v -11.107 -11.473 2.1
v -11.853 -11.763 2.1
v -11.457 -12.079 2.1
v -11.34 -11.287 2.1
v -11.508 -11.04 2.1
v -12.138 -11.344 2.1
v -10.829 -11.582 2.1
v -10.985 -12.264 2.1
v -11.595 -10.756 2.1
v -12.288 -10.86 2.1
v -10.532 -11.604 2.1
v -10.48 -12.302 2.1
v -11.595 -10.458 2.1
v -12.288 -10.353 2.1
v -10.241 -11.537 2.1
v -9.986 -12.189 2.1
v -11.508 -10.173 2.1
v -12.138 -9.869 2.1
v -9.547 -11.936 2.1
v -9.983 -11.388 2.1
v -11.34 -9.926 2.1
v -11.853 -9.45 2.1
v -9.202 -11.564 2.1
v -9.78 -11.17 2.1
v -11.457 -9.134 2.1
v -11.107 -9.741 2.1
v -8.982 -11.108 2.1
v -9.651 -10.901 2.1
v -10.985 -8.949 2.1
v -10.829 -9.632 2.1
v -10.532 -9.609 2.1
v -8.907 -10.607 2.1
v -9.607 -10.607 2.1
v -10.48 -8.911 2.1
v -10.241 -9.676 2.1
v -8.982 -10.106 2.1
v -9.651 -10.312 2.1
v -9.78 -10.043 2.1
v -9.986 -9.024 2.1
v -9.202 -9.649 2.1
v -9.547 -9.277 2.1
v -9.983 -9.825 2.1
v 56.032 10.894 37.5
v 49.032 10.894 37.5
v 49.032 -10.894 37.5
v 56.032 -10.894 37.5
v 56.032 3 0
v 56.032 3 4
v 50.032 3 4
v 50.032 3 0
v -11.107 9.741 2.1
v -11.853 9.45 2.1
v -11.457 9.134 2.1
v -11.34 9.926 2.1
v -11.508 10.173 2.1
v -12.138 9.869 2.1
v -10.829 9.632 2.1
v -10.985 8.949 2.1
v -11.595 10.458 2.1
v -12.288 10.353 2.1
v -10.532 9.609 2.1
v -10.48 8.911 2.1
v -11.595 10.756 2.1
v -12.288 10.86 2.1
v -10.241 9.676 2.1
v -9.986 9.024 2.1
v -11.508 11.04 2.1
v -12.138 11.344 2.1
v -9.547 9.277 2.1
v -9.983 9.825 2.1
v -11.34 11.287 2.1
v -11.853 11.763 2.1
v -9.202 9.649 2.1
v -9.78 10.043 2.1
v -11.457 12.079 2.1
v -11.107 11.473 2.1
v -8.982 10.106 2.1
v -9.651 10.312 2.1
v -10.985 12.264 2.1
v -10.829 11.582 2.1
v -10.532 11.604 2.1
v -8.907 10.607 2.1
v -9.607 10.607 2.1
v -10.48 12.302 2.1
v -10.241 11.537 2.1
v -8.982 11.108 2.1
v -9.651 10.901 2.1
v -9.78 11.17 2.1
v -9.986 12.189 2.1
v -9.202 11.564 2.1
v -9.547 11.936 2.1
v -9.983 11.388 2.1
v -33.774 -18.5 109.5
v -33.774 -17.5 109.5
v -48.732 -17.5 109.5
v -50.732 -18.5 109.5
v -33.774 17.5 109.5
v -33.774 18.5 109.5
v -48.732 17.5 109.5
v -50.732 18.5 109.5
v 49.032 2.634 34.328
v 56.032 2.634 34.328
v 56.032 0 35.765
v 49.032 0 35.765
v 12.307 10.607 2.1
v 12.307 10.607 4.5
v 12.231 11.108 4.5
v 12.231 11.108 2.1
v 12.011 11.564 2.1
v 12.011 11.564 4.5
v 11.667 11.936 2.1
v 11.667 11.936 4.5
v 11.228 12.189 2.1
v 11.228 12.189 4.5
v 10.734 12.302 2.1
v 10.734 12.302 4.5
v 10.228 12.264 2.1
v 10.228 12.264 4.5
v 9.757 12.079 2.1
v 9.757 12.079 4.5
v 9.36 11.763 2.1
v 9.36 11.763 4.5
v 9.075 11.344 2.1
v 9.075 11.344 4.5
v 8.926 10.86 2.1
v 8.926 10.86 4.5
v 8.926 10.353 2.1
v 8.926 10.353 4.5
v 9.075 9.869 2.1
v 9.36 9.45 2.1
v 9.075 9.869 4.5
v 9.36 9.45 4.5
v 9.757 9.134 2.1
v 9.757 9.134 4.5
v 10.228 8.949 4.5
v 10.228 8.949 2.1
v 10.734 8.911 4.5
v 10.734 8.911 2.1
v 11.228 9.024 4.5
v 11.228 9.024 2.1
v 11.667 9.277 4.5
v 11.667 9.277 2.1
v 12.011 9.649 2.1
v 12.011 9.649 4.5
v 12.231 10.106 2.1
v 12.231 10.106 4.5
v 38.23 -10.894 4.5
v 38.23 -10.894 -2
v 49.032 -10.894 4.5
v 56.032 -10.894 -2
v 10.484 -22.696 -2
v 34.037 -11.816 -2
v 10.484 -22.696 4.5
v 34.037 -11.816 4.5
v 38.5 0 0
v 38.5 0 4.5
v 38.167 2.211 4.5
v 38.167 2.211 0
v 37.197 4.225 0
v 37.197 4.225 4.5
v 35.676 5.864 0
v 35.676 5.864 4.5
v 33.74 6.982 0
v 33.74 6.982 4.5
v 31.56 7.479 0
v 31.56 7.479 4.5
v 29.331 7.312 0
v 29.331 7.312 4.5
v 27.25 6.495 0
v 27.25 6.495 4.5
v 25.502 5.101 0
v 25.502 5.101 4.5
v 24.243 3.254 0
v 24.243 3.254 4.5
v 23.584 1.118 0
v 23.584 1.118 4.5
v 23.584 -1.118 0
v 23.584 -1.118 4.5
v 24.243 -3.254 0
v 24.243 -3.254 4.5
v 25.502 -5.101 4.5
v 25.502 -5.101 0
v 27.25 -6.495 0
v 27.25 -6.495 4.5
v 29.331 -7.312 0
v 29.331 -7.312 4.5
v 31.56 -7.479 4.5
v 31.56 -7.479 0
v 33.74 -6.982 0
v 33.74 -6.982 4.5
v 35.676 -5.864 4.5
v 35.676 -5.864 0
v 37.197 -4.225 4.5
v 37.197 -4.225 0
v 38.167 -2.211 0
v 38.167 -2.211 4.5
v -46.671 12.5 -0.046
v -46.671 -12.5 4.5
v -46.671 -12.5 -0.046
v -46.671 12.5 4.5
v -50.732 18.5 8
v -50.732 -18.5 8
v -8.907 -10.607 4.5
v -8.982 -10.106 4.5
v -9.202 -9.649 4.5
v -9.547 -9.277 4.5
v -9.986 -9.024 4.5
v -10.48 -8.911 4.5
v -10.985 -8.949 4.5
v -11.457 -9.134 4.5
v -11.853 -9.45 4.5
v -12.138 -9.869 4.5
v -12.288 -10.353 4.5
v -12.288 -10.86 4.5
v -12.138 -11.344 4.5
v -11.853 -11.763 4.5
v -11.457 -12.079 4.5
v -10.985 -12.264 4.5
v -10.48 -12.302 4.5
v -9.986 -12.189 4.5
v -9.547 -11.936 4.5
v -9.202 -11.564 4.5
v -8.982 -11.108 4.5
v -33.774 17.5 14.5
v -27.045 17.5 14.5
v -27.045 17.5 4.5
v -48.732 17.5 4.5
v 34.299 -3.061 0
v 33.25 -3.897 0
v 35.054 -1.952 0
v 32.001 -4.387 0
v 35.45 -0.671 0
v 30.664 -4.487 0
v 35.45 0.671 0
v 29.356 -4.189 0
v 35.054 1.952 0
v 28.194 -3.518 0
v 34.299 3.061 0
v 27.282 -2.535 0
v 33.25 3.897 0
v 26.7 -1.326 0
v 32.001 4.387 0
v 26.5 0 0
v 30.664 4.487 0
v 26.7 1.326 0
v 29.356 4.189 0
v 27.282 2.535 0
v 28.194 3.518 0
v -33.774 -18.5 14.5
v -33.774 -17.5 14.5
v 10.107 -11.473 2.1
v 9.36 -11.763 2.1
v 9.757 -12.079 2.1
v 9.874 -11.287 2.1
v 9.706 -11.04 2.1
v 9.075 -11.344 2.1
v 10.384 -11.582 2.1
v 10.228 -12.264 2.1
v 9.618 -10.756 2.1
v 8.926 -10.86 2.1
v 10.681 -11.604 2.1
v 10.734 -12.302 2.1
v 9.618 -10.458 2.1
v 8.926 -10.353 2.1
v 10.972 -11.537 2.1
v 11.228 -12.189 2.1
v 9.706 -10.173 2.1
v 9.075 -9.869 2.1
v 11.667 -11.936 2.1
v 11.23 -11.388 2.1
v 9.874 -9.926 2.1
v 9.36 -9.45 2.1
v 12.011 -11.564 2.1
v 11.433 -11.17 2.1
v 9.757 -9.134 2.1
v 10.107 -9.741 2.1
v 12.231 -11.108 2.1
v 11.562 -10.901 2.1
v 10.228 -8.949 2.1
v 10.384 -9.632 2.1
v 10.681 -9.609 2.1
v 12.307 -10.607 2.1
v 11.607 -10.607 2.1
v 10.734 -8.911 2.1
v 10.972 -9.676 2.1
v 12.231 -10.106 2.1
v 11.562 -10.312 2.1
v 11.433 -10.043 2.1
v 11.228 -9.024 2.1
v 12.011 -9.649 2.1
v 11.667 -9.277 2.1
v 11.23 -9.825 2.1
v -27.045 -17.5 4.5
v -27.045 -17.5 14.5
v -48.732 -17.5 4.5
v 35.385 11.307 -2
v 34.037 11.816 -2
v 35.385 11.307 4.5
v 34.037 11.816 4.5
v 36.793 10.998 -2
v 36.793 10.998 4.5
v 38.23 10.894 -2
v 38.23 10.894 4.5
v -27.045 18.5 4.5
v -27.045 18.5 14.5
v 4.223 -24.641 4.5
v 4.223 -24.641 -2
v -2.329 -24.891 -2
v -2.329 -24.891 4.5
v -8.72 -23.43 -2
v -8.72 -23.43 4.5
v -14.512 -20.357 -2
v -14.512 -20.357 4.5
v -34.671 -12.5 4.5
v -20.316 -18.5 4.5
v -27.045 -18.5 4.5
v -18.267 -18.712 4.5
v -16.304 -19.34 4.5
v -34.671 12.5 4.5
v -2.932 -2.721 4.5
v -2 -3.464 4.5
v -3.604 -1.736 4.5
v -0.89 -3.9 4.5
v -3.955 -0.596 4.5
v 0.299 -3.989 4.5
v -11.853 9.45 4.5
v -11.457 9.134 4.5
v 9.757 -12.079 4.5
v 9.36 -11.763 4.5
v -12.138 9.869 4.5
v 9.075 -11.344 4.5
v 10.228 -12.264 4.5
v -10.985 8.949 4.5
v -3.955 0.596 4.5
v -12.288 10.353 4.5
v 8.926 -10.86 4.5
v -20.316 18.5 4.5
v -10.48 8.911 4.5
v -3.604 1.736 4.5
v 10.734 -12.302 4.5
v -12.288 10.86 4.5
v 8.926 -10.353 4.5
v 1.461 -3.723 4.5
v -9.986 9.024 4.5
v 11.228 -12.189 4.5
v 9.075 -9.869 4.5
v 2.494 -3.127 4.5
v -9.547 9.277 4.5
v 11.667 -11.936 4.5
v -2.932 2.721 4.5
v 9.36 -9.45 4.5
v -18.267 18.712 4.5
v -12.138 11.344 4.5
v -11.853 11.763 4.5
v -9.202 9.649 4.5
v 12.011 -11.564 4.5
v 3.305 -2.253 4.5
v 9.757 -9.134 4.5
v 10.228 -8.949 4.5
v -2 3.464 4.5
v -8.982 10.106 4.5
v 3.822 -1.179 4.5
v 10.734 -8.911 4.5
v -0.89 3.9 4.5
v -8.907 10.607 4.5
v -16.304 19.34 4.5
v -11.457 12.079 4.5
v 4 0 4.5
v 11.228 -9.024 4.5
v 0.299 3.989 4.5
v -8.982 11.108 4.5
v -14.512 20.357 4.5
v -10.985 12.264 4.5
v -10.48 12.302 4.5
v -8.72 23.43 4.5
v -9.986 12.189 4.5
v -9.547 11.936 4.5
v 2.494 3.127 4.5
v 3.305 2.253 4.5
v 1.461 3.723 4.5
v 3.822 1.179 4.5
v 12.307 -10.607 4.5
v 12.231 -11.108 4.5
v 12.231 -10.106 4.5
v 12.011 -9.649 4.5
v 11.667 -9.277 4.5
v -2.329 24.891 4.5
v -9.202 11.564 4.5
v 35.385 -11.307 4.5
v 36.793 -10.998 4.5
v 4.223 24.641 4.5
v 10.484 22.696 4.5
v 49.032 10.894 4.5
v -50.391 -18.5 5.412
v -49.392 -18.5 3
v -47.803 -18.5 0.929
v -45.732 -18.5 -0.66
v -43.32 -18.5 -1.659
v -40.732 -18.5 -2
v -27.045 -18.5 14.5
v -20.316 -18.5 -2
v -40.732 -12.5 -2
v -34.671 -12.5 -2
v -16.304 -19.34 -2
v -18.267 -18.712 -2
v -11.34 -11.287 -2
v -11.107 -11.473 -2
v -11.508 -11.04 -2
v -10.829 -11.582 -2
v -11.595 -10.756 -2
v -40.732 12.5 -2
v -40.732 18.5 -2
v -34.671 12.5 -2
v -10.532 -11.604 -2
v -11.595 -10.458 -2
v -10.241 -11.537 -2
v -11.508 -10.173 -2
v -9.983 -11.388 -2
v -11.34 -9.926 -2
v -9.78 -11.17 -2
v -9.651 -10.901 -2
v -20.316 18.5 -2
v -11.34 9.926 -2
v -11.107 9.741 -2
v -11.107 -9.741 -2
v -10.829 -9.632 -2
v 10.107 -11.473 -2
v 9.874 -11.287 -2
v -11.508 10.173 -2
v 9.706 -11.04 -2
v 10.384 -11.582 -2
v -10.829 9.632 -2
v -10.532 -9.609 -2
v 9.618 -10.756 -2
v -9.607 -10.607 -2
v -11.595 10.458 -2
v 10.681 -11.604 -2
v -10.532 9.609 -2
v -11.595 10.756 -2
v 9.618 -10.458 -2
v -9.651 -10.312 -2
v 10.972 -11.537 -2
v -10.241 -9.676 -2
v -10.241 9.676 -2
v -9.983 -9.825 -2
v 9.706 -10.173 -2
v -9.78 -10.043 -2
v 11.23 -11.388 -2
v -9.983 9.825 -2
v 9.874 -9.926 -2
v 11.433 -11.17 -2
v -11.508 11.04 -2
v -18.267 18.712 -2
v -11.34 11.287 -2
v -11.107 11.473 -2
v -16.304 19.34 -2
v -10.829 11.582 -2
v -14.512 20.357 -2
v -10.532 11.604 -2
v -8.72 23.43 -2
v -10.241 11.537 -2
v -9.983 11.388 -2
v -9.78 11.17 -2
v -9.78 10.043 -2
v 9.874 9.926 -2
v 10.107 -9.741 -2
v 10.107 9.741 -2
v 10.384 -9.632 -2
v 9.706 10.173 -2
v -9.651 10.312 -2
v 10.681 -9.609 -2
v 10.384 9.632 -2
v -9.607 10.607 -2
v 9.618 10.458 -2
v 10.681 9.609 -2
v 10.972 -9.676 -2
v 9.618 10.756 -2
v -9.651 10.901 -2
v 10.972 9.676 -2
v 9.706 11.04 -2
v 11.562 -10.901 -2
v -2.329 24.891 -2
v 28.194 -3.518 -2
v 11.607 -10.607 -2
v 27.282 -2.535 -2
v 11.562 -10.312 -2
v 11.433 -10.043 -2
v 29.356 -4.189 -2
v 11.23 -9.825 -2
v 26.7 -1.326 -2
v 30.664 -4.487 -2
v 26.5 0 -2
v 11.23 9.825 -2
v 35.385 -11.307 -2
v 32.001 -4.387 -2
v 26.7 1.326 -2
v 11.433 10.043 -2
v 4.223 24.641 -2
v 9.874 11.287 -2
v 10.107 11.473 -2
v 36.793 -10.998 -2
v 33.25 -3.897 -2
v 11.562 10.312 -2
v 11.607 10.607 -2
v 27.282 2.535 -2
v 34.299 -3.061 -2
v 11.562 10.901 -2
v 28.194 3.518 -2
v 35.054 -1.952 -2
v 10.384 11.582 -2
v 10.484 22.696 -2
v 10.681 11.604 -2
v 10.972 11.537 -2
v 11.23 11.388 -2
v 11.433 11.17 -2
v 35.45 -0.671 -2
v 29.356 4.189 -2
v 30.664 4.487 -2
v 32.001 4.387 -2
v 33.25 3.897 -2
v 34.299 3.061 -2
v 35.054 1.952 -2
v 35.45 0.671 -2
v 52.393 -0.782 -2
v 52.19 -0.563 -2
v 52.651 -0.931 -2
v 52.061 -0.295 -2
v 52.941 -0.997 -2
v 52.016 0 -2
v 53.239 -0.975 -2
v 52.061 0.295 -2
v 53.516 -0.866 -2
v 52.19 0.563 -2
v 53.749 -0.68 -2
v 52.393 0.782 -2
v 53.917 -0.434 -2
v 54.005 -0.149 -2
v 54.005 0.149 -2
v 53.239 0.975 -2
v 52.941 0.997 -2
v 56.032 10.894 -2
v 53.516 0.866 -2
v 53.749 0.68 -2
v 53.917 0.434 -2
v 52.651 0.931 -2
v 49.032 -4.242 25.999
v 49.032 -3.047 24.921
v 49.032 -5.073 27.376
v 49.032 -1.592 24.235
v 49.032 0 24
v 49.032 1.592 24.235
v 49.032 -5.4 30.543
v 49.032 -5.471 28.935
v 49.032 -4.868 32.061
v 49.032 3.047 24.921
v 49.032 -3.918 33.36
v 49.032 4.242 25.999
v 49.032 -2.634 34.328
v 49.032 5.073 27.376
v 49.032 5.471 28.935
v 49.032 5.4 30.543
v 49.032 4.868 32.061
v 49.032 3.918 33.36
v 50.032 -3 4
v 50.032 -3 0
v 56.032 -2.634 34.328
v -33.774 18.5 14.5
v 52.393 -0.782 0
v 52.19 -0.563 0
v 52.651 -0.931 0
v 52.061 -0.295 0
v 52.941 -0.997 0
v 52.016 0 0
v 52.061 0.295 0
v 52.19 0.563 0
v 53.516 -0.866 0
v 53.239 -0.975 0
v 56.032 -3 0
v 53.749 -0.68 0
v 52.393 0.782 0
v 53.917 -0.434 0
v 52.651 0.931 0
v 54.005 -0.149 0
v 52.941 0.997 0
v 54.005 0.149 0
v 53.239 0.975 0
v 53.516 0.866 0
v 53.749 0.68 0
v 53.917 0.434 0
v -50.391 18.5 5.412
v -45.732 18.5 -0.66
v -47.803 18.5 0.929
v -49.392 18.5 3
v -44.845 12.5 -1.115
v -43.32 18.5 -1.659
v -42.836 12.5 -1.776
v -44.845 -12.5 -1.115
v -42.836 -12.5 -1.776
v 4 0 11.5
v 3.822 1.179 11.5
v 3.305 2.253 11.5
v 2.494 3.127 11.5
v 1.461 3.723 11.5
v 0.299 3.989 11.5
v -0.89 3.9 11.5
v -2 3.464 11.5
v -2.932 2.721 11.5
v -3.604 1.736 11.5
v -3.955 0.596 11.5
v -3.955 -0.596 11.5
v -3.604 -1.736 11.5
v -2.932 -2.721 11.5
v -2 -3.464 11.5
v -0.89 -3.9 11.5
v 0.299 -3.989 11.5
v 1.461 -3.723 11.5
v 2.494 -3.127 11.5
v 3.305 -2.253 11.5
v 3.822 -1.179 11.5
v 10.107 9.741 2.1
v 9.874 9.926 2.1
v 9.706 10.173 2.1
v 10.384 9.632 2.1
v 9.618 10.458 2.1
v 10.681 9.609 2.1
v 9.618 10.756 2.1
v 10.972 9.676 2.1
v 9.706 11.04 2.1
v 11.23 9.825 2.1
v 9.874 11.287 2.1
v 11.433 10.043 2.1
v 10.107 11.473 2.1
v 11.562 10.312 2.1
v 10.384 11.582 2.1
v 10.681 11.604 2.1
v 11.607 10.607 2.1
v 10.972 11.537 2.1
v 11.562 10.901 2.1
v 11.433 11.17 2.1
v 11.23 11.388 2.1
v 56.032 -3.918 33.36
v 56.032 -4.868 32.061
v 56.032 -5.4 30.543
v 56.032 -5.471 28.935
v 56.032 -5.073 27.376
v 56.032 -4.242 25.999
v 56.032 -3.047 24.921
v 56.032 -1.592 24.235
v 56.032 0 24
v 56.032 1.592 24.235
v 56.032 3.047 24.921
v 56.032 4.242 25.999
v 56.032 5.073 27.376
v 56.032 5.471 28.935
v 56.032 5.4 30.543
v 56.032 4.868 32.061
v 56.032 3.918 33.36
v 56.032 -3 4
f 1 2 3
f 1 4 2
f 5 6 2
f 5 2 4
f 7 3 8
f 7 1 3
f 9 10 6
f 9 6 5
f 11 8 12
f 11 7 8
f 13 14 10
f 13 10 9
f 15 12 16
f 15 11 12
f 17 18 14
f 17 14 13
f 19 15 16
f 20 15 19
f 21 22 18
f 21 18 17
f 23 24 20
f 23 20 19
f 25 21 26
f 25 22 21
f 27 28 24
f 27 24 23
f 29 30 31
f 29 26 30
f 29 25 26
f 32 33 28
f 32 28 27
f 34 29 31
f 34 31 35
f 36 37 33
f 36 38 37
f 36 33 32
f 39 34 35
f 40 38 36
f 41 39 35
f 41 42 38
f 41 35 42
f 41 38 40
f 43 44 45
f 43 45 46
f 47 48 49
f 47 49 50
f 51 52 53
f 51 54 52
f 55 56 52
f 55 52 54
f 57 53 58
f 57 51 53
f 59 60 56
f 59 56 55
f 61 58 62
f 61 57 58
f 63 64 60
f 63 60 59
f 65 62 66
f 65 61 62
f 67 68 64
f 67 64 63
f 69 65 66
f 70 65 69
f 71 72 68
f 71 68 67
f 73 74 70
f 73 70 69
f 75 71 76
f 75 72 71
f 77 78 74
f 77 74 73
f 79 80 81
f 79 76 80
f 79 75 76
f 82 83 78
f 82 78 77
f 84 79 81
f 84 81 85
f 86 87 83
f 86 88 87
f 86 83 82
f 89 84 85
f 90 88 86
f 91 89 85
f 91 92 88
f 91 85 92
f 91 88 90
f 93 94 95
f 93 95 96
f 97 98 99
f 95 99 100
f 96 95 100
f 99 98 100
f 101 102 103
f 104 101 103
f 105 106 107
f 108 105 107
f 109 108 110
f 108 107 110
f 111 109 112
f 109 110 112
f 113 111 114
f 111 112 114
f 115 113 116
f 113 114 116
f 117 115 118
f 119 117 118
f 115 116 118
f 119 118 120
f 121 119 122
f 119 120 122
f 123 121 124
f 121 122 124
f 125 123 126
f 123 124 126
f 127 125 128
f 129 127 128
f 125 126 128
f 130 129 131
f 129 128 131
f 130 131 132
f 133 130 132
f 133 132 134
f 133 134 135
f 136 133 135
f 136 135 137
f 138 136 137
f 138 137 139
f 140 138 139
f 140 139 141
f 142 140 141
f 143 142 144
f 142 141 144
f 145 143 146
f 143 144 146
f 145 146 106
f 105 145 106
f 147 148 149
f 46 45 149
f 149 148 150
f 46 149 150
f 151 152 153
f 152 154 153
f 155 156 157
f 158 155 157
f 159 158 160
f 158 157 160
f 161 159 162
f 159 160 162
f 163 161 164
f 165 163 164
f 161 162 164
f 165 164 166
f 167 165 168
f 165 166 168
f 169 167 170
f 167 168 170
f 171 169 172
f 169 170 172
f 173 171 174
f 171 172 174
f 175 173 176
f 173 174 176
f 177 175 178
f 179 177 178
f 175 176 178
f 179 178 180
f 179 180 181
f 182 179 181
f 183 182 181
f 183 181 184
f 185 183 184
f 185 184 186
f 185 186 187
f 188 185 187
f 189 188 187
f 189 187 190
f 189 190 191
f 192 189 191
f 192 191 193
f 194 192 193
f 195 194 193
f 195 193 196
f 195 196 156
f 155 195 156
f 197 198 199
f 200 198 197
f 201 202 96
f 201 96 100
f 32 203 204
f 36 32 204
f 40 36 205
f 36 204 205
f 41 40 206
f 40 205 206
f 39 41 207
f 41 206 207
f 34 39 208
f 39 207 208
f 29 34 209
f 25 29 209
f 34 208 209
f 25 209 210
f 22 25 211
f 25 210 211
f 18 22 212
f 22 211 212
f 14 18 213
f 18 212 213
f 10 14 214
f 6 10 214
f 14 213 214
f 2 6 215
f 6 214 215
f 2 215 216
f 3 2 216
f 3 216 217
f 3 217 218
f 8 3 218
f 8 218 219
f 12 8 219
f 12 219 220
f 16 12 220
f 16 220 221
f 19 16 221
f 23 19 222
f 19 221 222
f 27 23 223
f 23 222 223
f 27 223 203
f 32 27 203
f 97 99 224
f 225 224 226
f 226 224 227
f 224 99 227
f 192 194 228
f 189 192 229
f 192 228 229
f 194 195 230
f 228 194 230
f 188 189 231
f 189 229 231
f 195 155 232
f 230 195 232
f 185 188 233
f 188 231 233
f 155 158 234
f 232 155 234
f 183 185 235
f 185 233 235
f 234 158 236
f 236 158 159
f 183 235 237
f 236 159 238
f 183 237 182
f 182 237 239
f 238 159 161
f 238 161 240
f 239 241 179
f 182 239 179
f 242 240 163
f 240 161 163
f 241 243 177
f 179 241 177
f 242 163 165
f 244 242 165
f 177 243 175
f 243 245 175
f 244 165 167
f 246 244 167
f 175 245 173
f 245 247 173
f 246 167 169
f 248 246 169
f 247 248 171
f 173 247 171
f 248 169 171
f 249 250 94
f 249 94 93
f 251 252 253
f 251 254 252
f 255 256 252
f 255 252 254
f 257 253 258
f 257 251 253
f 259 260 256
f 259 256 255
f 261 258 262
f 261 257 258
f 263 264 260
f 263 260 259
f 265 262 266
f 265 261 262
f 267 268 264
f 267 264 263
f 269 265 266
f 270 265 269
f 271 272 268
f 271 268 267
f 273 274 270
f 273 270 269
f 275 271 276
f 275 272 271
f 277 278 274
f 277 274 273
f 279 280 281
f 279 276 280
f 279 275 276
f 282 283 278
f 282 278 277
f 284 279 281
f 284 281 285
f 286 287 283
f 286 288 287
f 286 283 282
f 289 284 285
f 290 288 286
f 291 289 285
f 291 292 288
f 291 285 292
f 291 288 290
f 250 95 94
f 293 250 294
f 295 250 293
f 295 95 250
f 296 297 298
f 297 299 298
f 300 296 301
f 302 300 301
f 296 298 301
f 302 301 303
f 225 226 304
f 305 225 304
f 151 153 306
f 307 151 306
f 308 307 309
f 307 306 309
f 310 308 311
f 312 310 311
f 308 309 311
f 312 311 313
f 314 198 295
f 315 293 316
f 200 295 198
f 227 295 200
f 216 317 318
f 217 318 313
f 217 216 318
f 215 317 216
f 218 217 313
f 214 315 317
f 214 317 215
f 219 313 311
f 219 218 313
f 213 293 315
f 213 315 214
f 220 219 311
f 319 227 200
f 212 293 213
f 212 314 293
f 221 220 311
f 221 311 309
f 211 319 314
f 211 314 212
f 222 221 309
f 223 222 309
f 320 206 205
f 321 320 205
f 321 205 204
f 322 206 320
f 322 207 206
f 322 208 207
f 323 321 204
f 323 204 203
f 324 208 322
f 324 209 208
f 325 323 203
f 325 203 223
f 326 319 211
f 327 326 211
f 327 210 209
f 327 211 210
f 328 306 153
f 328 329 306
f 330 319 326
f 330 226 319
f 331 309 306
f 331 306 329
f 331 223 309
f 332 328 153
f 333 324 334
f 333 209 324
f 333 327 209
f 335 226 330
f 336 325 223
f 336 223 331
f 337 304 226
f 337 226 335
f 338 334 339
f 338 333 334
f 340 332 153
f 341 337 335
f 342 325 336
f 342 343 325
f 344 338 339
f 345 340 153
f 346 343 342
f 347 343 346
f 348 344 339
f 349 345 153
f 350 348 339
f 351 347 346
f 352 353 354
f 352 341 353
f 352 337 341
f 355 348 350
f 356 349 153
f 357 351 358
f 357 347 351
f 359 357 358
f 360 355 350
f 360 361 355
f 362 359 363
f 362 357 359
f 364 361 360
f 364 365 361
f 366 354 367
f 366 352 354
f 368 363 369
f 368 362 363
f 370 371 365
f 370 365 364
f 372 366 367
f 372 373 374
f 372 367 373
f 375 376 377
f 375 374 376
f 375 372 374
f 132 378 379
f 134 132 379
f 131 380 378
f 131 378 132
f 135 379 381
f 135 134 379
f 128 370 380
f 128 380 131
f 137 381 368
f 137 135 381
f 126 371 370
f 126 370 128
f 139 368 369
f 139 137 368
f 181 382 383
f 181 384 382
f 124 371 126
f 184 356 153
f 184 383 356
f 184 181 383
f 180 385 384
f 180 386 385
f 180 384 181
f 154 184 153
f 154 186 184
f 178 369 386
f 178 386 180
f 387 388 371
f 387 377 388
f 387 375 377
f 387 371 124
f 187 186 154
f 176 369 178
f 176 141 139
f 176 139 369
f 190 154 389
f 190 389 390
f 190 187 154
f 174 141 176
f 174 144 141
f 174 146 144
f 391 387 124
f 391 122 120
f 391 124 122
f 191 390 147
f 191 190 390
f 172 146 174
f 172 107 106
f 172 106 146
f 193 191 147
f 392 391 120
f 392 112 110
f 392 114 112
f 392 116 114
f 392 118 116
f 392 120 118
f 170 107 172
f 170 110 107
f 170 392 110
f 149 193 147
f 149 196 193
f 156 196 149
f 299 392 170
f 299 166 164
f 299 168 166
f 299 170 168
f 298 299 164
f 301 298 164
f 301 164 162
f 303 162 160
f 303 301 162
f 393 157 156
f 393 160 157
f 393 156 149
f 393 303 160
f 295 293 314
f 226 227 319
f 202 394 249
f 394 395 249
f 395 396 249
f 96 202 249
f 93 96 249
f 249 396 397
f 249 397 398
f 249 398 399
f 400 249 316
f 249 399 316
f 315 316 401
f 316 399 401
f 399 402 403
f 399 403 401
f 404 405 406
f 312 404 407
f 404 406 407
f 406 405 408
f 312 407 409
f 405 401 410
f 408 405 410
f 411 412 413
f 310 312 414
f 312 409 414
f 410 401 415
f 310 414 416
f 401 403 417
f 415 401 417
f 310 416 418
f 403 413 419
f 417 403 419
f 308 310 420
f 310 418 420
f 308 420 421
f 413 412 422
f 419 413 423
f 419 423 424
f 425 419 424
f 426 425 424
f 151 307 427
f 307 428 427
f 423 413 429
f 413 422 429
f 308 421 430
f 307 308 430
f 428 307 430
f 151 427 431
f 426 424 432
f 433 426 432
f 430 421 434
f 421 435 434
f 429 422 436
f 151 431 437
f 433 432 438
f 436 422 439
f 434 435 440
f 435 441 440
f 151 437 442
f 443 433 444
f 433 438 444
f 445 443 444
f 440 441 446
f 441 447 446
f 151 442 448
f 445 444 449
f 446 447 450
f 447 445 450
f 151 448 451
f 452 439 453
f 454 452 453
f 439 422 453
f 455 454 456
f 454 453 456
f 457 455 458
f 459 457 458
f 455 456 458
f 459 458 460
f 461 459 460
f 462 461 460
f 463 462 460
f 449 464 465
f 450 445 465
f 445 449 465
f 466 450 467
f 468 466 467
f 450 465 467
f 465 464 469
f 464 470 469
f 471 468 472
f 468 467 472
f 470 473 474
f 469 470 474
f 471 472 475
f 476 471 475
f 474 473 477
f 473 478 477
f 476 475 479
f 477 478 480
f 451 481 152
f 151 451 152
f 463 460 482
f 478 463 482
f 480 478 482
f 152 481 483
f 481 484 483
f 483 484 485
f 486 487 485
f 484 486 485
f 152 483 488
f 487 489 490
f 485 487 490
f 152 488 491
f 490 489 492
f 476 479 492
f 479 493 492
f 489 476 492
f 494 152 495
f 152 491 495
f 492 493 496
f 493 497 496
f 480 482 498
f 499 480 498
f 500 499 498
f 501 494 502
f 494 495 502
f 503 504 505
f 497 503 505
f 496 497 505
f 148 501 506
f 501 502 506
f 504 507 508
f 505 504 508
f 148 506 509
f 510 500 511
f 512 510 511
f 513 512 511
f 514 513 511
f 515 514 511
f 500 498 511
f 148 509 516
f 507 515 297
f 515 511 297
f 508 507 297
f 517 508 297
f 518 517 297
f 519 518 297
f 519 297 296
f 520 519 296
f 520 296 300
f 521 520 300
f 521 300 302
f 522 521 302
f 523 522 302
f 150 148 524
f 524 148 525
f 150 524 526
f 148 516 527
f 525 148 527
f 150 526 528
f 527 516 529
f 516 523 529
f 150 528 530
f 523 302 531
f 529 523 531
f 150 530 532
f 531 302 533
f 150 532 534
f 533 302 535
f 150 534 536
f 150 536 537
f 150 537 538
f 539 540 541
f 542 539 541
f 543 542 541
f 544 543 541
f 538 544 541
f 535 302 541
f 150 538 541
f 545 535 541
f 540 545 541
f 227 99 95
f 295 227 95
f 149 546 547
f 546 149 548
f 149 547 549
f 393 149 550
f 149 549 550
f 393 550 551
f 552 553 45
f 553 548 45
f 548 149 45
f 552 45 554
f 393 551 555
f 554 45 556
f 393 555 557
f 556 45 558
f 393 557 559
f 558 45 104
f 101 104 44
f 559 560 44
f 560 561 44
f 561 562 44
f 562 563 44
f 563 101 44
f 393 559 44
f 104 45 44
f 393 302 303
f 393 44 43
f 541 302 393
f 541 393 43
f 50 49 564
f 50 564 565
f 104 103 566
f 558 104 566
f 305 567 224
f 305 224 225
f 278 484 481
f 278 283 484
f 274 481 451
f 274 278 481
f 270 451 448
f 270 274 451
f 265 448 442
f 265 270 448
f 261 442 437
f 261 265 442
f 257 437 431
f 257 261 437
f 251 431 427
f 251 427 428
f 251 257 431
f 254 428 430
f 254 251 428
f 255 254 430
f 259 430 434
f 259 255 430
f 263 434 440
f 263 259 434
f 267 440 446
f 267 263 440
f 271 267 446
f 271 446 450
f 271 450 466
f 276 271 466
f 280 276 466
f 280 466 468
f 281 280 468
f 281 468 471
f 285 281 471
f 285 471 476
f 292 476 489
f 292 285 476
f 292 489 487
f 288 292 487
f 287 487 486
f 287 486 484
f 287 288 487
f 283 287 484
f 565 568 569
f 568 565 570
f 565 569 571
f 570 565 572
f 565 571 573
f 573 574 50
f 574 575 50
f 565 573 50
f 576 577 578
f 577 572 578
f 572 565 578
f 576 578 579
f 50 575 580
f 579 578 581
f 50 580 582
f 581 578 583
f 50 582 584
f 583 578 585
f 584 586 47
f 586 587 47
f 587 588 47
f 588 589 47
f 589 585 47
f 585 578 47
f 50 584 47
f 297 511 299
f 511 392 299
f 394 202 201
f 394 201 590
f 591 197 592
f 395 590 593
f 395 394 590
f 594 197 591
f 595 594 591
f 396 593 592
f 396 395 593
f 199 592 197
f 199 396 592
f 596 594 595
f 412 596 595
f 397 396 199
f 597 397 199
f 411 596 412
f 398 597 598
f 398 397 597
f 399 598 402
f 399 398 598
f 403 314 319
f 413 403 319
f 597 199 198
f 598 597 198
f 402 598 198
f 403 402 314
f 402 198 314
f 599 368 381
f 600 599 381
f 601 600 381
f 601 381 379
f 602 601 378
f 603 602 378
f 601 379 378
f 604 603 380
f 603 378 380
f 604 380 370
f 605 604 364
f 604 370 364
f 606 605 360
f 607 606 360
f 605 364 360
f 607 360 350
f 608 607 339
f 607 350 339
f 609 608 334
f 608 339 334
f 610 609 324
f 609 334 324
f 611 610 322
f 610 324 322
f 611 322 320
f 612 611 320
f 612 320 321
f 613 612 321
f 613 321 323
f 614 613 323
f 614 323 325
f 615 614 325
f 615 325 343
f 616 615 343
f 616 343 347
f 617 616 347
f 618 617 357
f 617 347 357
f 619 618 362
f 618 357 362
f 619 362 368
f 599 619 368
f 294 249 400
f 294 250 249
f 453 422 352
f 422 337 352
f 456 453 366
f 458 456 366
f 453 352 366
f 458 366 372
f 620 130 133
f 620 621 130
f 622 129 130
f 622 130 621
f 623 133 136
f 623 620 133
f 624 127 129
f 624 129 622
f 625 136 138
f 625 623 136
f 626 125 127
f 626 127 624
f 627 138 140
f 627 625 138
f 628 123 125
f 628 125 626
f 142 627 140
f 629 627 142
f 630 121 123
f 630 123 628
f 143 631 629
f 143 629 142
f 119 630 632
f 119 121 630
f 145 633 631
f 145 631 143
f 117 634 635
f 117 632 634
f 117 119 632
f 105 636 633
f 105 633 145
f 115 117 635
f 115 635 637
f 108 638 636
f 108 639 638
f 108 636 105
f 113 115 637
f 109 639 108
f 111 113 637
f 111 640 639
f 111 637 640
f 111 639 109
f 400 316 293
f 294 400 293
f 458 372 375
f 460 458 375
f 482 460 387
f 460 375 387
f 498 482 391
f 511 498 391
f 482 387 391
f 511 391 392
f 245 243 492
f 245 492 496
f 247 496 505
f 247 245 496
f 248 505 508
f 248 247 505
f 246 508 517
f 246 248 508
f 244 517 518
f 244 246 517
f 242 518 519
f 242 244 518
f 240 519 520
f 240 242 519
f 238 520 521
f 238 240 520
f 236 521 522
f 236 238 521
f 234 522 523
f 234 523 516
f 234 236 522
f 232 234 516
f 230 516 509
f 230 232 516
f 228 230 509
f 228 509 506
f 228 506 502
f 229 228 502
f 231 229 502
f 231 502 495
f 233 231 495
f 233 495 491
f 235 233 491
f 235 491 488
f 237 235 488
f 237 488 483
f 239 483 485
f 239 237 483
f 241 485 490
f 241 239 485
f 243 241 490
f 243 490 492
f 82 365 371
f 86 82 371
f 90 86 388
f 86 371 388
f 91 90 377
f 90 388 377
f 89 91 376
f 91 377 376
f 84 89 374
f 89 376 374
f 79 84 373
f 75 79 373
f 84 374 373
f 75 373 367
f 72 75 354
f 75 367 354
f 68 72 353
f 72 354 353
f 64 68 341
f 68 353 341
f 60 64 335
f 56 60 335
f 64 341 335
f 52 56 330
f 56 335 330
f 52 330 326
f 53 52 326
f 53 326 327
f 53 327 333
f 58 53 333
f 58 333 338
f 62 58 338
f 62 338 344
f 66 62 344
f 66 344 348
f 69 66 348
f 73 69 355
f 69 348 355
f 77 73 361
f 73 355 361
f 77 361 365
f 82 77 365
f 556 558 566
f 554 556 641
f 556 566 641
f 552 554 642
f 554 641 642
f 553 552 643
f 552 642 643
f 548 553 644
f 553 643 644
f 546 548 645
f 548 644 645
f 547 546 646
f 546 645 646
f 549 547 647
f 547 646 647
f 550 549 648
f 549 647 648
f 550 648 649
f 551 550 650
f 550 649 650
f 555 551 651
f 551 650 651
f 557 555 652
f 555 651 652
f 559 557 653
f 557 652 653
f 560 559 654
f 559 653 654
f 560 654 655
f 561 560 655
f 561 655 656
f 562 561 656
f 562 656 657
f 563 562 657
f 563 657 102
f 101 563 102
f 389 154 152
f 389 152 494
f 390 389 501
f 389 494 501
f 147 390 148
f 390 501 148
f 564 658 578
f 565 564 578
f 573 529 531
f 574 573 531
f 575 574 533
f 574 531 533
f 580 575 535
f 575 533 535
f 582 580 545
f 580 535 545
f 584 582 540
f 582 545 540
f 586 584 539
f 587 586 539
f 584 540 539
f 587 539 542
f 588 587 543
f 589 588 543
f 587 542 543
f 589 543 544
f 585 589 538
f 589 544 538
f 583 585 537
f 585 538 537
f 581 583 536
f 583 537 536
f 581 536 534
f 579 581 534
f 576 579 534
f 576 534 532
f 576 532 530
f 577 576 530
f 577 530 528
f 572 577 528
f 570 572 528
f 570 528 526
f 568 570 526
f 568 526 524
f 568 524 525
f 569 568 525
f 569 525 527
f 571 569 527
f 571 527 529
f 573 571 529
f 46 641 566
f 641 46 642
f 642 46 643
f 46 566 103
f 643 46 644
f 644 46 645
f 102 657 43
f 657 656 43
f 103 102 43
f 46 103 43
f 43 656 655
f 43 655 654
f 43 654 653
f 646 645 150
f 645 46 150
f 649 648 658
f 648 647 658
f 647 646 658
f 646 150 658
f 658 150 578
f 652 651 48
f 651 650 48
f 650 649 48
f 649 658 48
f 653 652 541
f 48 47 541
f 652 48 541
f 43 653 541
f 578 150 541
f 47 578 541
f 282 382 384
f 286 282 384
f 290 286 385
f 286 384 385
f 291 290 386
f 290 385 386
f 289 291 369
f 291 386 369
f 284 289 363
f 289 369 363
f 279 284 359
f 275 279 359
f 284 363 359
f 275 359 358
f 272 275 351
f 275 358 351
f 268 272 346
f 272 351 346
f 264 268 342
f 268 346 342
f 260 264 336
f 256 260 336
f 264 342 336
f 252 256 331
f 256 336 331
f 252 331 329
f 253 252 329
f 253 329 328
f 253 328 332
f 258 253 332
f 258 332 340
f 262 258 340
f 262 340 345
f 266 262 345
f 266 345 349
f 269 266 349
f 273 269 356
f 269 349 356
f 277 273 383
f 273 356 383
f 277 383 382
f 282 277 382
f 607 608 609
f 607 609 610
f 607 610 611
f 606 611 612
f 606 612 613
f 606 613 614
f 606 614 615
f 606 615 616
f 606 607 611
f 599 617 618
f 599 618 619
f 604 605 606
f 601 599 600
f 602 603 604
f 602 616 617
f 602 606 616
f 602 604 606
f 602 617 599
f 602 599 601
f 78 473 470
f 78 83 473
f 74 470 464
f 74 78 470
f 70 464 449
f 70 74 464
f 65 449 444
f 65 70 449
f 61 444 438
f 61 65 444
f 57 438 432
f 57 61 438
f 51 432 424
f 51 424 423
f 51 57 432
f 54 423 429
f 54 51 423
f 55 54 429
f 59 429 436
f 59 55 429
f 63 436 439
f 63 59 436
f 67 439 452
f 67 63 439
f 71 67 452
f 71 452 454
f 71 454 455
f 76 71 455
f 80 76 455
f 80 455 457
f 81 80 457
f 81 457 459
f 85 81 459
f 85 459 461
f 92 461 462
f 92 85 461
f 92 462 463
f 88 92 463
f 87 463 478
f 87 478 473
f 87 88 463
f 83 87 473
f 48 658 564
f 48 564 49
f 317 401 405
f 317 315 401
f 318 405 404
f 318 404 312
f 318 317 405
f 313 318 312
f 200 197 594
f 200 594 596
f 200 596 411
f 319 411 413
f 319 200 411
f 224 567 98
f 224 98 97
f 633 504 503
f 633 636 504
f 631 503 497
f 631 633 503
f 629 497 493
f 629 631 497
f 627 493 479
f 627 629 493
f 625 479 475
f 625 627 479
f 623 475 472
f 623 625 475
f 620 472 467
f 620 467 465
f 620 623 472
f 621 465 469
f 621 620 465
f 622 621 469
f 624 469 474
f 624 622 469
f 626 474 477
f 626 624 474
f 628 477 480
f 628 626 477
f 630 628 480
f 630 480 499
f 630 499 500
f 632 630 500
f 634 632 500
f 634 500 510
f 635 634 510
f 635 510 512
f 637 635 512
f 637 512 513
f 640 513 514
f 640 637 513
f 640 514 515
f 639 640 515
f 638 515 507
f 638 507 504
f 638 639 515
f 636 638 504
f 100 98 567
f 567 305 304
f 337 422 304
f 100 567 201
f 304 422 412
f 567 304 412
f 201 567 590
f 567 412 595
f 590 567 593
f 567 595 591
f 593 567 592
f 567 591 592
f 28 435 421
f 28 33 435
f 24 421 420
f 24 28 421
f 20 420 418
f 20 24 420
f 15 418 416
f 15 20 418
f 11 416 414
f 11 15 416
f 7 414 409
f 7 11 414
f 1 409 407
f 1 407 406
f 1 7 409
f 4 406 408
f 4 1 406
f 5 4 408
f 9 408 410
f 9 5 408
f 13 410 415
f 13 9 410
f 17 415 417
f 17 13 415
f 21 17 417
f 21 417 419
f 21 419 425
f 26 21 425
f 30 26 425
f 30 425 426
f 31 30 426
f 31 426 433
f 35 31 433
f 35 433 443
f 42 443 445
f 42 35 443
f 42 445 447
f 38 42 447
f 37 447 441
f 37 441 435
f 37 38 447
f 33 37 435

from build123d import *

# Parameters (mm, degrees)
BOSS_EXTRUDE1_DEPTH  = 4.5
SKETCH2_R            = 7.5
CUT_EXTRUDE1_DEPTH   = 50.942466899
SKETCH3_R            = 4
BOSS_EXTRUDE2_DEPTH  = 7
BOSS_EXTRUDE3_DEPTH  = 4.5
FILLET1_R            = 10
CUT_EXTRUDE4_DEPTH   = 62.754464971
SKETCH9_R            = 1
CUT_EXTRUDE5_DEPTH   = 62.182594482
SKETCH10_R           = 1.7
CUT_EXTRUDE6_DEPTH   = 2.4
CUT_EXTRUDE7_DEPTH   = 4.5
FILLET2_R            = 10
CUT_EXTRUDE8_DEPTH   = 51.658168147
SKETCH23_R           = 1
SKETCH23_R_2         = 4.5
BOSS_EXTRUDE6_DEPTH  = 2
BOSS_EXTRUDE7_START  = -6.5
BOSS_EXTRUDE7_DEPTH  = 6.5
SKETCH26_W           = 9
SKETCH26_H           = 21.787737724
BOSS_EXTRUDE8_DEPTH  = 33
CUT_EXTRUDE9_REACH   = 94.723
SKETCH27_R           = 5
BOSS_EXTRUDE9_DEPTH  = 6.5
BOSS_EXTRUDE10_DEPTH = 105
FILLET3_R            = 10
FILLET4_R            = 10
CUT_EXTRUDE10_DEPTH  = 9
SKETCH31_W           = 12
SKETCH31_H           = 25
CUT_EXTRUDE11_DEPTH  = 122.612556686
BOSS_EXTRUDE11_DEPTH = 10
CUT_EXTRUDE12_REACH  = 141.704
SKETCH33_W           = 10
SKETCH33_H           = 33
CUT_EXTRUDE13_REACH  = 155.593
SKETCH34_W           = 105
SKETCH34_H           = 35
CUT_EXTRUDE14_REACH  = 156.964
SKETCH35_R           = 5.5
CUT_EXTRUDE15_REACH  = 156.964
SKETCH37_W           = 2
SKETCH37_H           = 21.787737724
CUT_EXTRUDE16_DEPTH  = 33
SKETCH38_W           = 4
SKETCH38_H           = 6
CUT_EXTRUDE17_DEPTH  = 6
SKETCH39_R           = 1
CUT_EXTRUDE18_DEPTH  = 6


with BuildPart() as part:
    # Sketch1 → Boss-Extrude1 (new body)
    with BuildSketch(Plane.XY):
        with BuildLine():
            Line((10.483870968, 22.695560128), (36.032258065, 10.893868862))
            ThreePointArc((36.032258065, 10.893868862), (43, 0), (36.032258065, -10.893868862))
            Line((36.032258065, -10.893868862), (10.483870968, -22.695560128))
            ThreePointArc((10.483870968, -22.695560128), (-25, 0), (10.483870968, 22.695560128))
        make_face()
    extrude(amount=BOSS_EXTRUDE1_DEPTH)

    # Sketch2 → Cut-Extrude1 (cut, through all)
    with BuildSketch(Plane.XY.offset(4.5)):
        with Locations((31, 0)):
            Circle(SKETCH2_R)
    extrude(amount=-CUT_EXTRUDE1_DEPTH, mode=Mode.SUBTRACT)

    # Sketch3 → Boss-Extrude2 (add)
    with BuildSketch(Plane.XY.offset(4.5)):
        Circle(SKETCH3_R)
    extrude(amount=BOSS_EXTRUDE2_DEPTH)

    # Sketch4 → Boss-Extrude3 (add)
    with BuildSketch(Plane(origin=(0, 0, 0), x_dir=(-1, 0, 0), z_dir=(0, 0, -1))):
        with BuildLine():
            Line((-36.032258065, 10.893868862), (-56.032258065, 10.893868862))
            Line((-56.032258065, 10.893868862), (-56.032258065, -10.893868862))
            Line((-56.032258065, -10.893868862), (-36.032258065, -10.893868862))
            ThreePointArc((-36.032258065, -10.893868862), (-43, 0), (-36.032258065, 10.893868862))
        make_face()
        with BuildLine():
            Line((22.501635968, 10.893868862), (42.501635968, 10.893868862))
            Line((42.501635968, 10.893868862), (42.501635968, -10.893868862))
            Line((42.501635968, -10.893868862), (22.501635968, -10.893868862))
            ThreePointArc((22.501635968, -10.893868862), (25, 0), (22.501635968, 10.893868862))
        make_face()
    extrude(amount=-BOSS_EXTRUDE3_DEPTH)

    # Fillet1
    fillet1_edges = [part.edges().sort_by_distance(p)[0] for p in [
        (56.032258065, 10.893868862, 2.25),
        (56.032258065, -10.893868862, 2.25),
        (-42.501635968, -10.893868862, 2.25),
        (-42.501635968, 10.893868862, 2.25),
    ]]
    fillet(fillet1_edges, radius=FILLET1_R)

    # Sketch8 → Cut-Extrude4 (cut, through all)
    with BuildSketch(Plane.XY.offset(4.5)):
        with BuildLine():
            Line((56.032258065, 0.893868862), (56.032258065, -0.893868862))
            ThreePointArc((56.032258065, -0.893868862), (55.873267798, -2.669967796), (55.401352579, -4.389590243))
            Line((55.401352579, -4.389590243), (55.401352579, 4.389590243))
            ThreePointArc((55.401352579, 4.389590243), (55.873267798, 2.669967796), (56.032258065, 0.893868862))
        make_face()
        with BuildLine():
            Line((-42.501635968, -0.893868862), (-42.501635968, 0.893868862))
            ThreePointArc((-42.501635968, 0.893868862), (-42.342645701, 2.669967796), (-41.870730482, 4.389590243))
            Line((-41.870730482, 4.389590243), (-41.870730482, -4.389590243))
            ThreePointArc((-41.870730482, -4.389590243), (-42.342645701, -2.669967796), (-42.501635968, -0.893868862))
        make_face()
    extrude(amount=-CUT_EXTRUDE4_DEPTH, mode=Mode.SUBTRACT)

    # Sketch9 → Cut-Extrude5 (cut, through all)
    with BuildSketch(Plane.XY.offset(4.5)):
        with Locations((-10.606601718, 10.606601718)):
            Circle(SKETCH9_R)
        with Locations((10.606601718, 10.606601718)):
            Circle(SKETCH9_R)
        with Locations((10.606601718, -10.606601718)):
            Circle(SKETCH9_R)
        with Locations((-10.606601718, -10.606601718)):
            Circle(SKETCH9_R)
    extrude(amount=-CUT_EXTRUDE5_DEPTH, mode=Mode.SUBTRACT)

    # Sketch10 → Cut-Extrude6 (cut)
    with BuildSketch(Plane.XY.offset(4.5)):
        with Locations((-10.606601718, 10.606601718)):
            Circle(SKETCH10_R)
        with Locations((10.606601718, 10.606601718)):
            Circle(SKETCH10_R)
        with Locations((10.606601718, -10.606601718)):
            Circle(SKETCH10_R)
        with Locations((-10.606601718, -10.606601718)):
            Circle(SKETCH10_R)
    extrude(amount=-CUT_EXTRUDE6_DEPTH, mode=Mode.SUBTRACT)

    # Sketch11 → Cut-Extrude7 (cut)
    with BuildSketch(Plane(origin=(0, 0, 0), x_dir=(-1, 0, 0), z_dir=(0, 0, -1))):
        with BuildLine():
            Line((-40.960235838, 14.646128502), (-73.67178465, 18.9155259))
            Line((-73.67178465, 18.9155259), (-68.640309048, -15.675868866))
            Line((-68.640309048, -15.675868866), (-41.444996676, -13.212200821))
            ThreePointArc((-41.444996676, -13.212200821), (-43.493415761, 0.756825882), (-40.960235838, 14.646128502))
        make_face()
    extrude(amount=-CUT_EXTRUDE7_DEPTH, mode=Mode.SUBTRACT)

    # Fillet2
    # the kernel refuses this fillet: 10 mm, written as the material it takes off along each edge
    with BuildSketch(Plane(origin=(42.113817462, -10.893868862, 28.001897109), x_dir=(0.1443560651040101, 0.9895258088941827, 0), z_dir=(0, 0, -1))) as fillet2_piece_1:
        with BuildLine():
            CenterArc((8.32021185, -9.941449502), FILLET2_R, 83.796810377, 73.10182949)
            Line((-0.877909984, -6.017859982), (-1.061872421, -5.939388192))
            ThreePointArc((-1.061872421, -5.939388192), (-0.636860154, -2.980058778), (-0.197905162, 0.028871213))
            Line((-0.197905162, 0.028871213), (-0.02161094, 0.19882899))
            ThreePointArc((-0.02161094, 0.19882899), (4.700379422, 0.454694668), (9.422369784, 0.19882899))
            Line((9.422369784, 0.19882899), (9.400758844, 0))
        make_face()
    extrude(amount=51.503794219, mode=Mode.SUBTRACT)
    with BuildSketch(Plane(origin=(42.113817462, 10.893868862, 28.001897109), x_dir=(-1, 0, 0), z_dir=(0, 0, -1))) as fillet2_piece_2:
        with BuildLine():
            CenterArc((8.636247816, -9.668172893), FILLET2_R, 104.801368002, 73.10182949)
            Line((-1.357056556, -9.302293499), (-1.556922643, -9.294975911))
            ThreePointArc((-1.556922643, -9.294975911), (-1.128460387, -4.585508816), (-0.193626747, 0.050086753))
            Line((-0.193626747, 0.050086753), (0, 0.2))
            ThreePointArc((0, 0.2), (3.040779699, 0.2), (6.030465629, 0.193363458))
            Line((6.030465629, 0.193363458), (6.081559398, 0))
        make_face()
    extrude(amount=51.503794219, mode=Mode.SUBTRACT)

    # Sketch12 → Cut-Extrude8 (cut, through all)
    with BuildSketch(Plane.XY.offset(4.5)):
        with BuildLine():
            Line((-22.501635968, 10.893868862), (-42.592674389, 14.819498464))
            Line((-42.592674389, 14.819498464), (-48.148078041, -13.612584929))
            Line((-48.148078041, -13.612584929), (-27.427309778, -14.315310761))
            Line((-27.427309778, -14.315310761), (-22.501635968, -10.893868862))
            ThreePointArc((-22.501635968, -10.893868862), (-25, 0), (-22.501635968, 10.893868862))
        make_face()
    extrude(amount=-CUT_EXTRUDE8_DEPTH, mode=Mode.SUBTRACT)

    # Sketch23 → Boss-Extrude6 (add)
    with BuildSketch(Plane(origin=(0, 0, 0), x_dir=(-1, 0, 0), z_dir=(0, 0, -1))):
        with BuildLine():
            Line((-36.032258065, -10.893868862), (-10.483870968, -22.695560128))
            ThreePointArc((-10.483870968, -22.695560128), (25, 0), (-10.483870968, 22.695560128))
            Line((-10.483870968, 22.695560128), (-36.032258065, 10.893868862))
            ThreePointArc((-36.032258065, 10.893868862), (-41.287575846, 7.470998455), (-43.470874018, 1.591575362))
            ThreePointArc((-43.470874018, 1.591575362), (-43.5, 0), (-43.470874018, -1.591575362))
            ThreePointArc((-43.470874018, -1.591575362), (-41.287575846, -7.470998455), (-36.032258065, -10.893868862))
        make_face()
        with Locations(Location((-10.606601718, -10.606601718, 0), (0, 0, 180))):
            Circle(SKETCH23_R, mode=Mode.SUBTRACT)
        with Locations(Location((10.606601718, -10.606601718, 0), (0, 0, 180))):
            Circle(SKETCH23_R, mode=Mode.SUBTRACT)
        with Locations(Location((10.606601718, 10.606601718, 0), (0, 0, 180))):
            Circle(SKETCH23_R, mode=Mode.SUBTRACT)
        with Locations(Location((-10.606601718, 10.606601718, 0), (0, 0, 180))):
            Circle(SKETCH23_R, mode=Mode.SUBTRACT)
        with Locations((-31, 0)):
            Circle(SKETCH23_R_2, mode=Mode.SUBTRACT)
    extrude(amount=BOSS_EXTRUDE6_DEPTH)

    # Sketch25 → Boss-Extrude7 (add)
    with BuildSketch(Plane(origin=(0, 0, -2), x_dir=(-1, 0, 0), z_dir=(0, 0, -1)).offset(BOSS_EXTRUDE7_START)):
        with BuildLine():
            Line((-36.032258065, 10.893868862), (-56.032258065, 10.893868862))
            Line((-56.032258065, 10.893868862), (-56.032258065, -10.893868862))
            Line((-56.032258065, -10.893868862), (-36.032258065, -10.893868862))
            ThreePointArc((-36.032258065, -10.893868862), (-41.287575846, -7.470998455), (-43.470874018, -1.591575362))
            ThreePointArc((-43.470874018, -1.591575362), (-43.5, 0), (-43.470874018, 1.591575362))
            ThreePointArc((-43.470874018, 1.591575362), (-41.287575846, 7.470998455), (-36.032258065, 10.893868862))
        make_face()
    extrude(amount=BOSS_EXTRUDE7_DEPTH)

    # Sketch26 → Boss-Extrude8 (add)
    with BuildSketch(Plane.XY.offset(4.5)):
        with Locations((51.532258065, 0)):
            Rectangle(SKETCH26_W, SKETCH26_H)
    extrude(amount=BOSS_EXTRUDE8_DEPTH)

    # Sketch27 → Cut-Extrude9 (cut, up to next)
    with BuildSketch(Plane(origin=(56.032258065, 0, 0), x_dir=(0, 0, -1), z_dir=(1, 0, 0)), mode=Mode.PRIVATE) as cut_extrude9_sk1:
        with Locations((-29.5, 0)):
            Circle(SKETCH27_R)
    cut_extrude9_tool1 = extrude(cut_extrude9_sk1.sketch, amount=-CUT_EXTRUDE9_REACH, mode=Mode.PRIVATE) & part.part
    add(cut_extrude9_tool1.solids().sort_by_distance((56.032258, 0, 29.5))[0], mode=Mode.SUBTRACT)

    # Sketch28 → Boss-Extrude9 (add)
    with BuildSketch(Plane(origin=(0, 0, -2), x_dir=(-1, 0, 0), z_dir=(0, 0, -1))):
        with BuildLine():
            Line((16.815171721, 18.5), (50.732139714, 18.5))
            Line((50.732139714, 18.5), (50.732139714, -18.5))
            Line((50.732139714, -18.5), (16.815171721, -18.5))
            ThreePointArc((16.815171721, -18.5), (25, 0), (16.815171721, 18.5))
        make_face()
    extrude(amount=-BOSS_EXTRUDE9_DEPTH)

    # Sketch29 → Boss-Extrude10 (add)
    with BuildSketch(Plane.XY.offset(4.5)):
        Polygon((-50.732139714, 18.5), (-33.773655718, 18.5), (-33.773655718, 16.5), (-48.732139714, 16.5), (-48.732139714, -16.5), (-33.773655718, -16.5), (-33.773655718, -18.5), (-50.732139714, -18.5), align=None)
    extrude(amount=BOSS_EXTRUDE10_DEPTH)

    # Fillet3
    fillet3_edges = [part.edges().sort_by_distance(p)[0] for p in [
        (-50.732139714, 0, -2),
    ]]
    fillet(fillet3_edges, radius=FILLET3_R)

    # Fillet4
    fillet4_edges = [part.edges().sort_by_distance(p)[0] for p in [
        (-16.815171721, 18.5, 1.25),
        (-16.815171721, -18.5, 1.25),
        (36.032258065, 10.893868862, 1.25),
        (36.032258065, -10.893868862, 1.25),
    ]]
    fillet(fillet4_edges, radius=FILLET4_R)

    # Sketch30 → Cut-Extrude10 (cut)
    with BuildSketch(Plane(origin=(56.032258065, 0, 0), x_dir=(0, 0, -1), z_dir=(1, 0, 0))):
        with BuildLine():
            Line((-34.192833193, 1.725490257), (-34.827272241, 0))
            Line((-34.827272241, 0), (-34.192833193, -1.725490257))
            ThreePointArc((-34.192833193, -1.725490257), (-34.5, 0), (-34.192833193, 1.725490257))
        make_face()
    extrude(amount=-CUT_EXTRUDE10_DEPTH, mode=Mode.SUBTRACT)

    # Sketch31 → Cut-Extrude11 (cut, through all)
    with BuildSketch(Plane.XY.offset(4.5)):
        with Locations((-40.670586902, 0)):
            Rectangle(SKETCH31_W, SKETCH31_H)
    extrude(amount=-CUT_EXTRUDE11_DEPTH, mode=Mode.SUBTRACT)

    # Sketch32 → Boss-Extrude11 (add)
    with BuildSketch(Plane.XY.offset(4.5)):
        Polygon((-33.773655718, 18.5), (-33.773655718, 16.5), (-27.732139714, 16.5), (-27.732139714, -16.5), (-33.773655718, -16.5), (-33.773655718, -18.5), (-27.044952686, -18.5), (-27.044952686, 18.5), align=None)
    extrude(amount=BOSS_EXTRUDE11_DEPTH)

    # Sketch33 → Cut-Extrude12 (cut, up to next)
    with BuildSketch(Plane(origin=(-27.044952686, 0, 0), x_dir=(0, 0, -1), z_dir=(1, 0, 0)), mode=Mode.PRIVATE) as cut_extrude12_sk1:
        with Locations((-9.5, 0)):
            Rectangle(SKETCH33_W, SKETCH33_H)
    cut_extrude12_tool1 = extrude(cut_extrude12_sk1.sketch, amount=-CUT_EXTRUDE12_REACH, mode=Mode.PRIVATE) & part.part
    add(cut_extrude12_tool1.solids().sort_by_distance((-27.044953, 0, 9.5))[0], mode=Mode.SUBTRACT)

    # Cut-Extrude13: up to this face of the body (flat: up to its plane)
    cut_extrude13_end = Plane(part.part.faces().sort_by_distance((-27.044952686, -17.5, 9.5))[0])
    # Sketch34 → Cut-Extrude13 (cut, up to the picked face)
    with BuildSketch(Plane(origin=(-48.732139714, 0, 0), x_dir=(0, 0, -1), z_dir=(1, 0, 0)), mode=Mode.PRIVATE) as cut_extrude13_sk1:
        with Locations((-57, 0)):
            Rectangle(SKETCH34_W, SKETCH34_H)
    cut_extrude13_tool1 = split(extrude(cut_extrude13_sk1.sketch, amount=CUT_EXTRUDE13_REACH, mode=Mode.PRIVATE), bisect_by=cut_extrude13_end, keep=Keep.BOTH, mode=Mode.PRIVATE)
    add(cut_extrude13_tool1.solids().sort_by(Axis((-48.73214, 0, 57), (1, 0, 0)))[0], mode=Mode.SUBTRACT)

    # Sketch35 → Cut-Extrude14 (cut, up to next)
    with BuildSketch(Plane(origin=(56.032258065, 0, 0), x_dir=(0, 0, -1), z_dir=(1, 0, 0)), mode=Mode.PRIVATE) as cut_extrude14_sk1:
        with Locations((-29.5, 0)):
            Circle(SKETCH35_R)
    cut_extrude14_tool1 = extrude(cut_extrude14_sk1.sketch, amount=-CUT_EXTRUDE14_REACH, mode=Mode.PRIVATE) & part.part
    add(cut_extrude14_tool1.solids().sort_by_distance((56.032258, 0, 29.5))[0], mode=Mode.SUBTRACT)

    # Sketch36 → Cut-Extrude15 (cut, up to next)
    with BuildSketch(Plane(origin=(56.032258065, 0, 0), x_dir=(0, 0, -1), z_dir=(1, 0, 0)), mode=Mode.PRIVATE) as cut_extrude15_sk1:
        with BuildLine():
            Line((-34.328425651, 2.633686719), (-35.764982043, 0))
            Line((-35.764982043, 0), (-34.328425651, -2.633686719))
            ThreePointArc((-34.328425651, -2.633686719), (-35, 0), (-34.328425651, 2.633686719))
        make_face()
    cut_extrude15_tool1 = extrude(cut_extrude15_sk1.sketch, amount=-CUT_EXTRUDE15_REACH, mode=Mode.PRIVATE) & part.part
    add(cut_extrude15_tool1.solids().sort_by_distance((56.032258, 0, 35.16481))[0], mode=Mode.SUBTRACT)

    # Sketch37 → Cut-Extrude16 (cut)
    with BuildSketch(Plane.XY.offset(37.5)):
        with Locations((48.032258065, 0)):
            Rectangle(SKETCH37_W, SKETCH37_H)
    extrude(amount=-CUT_EXTRUDE16_DEPTH, mode=Mode.SUBTRACT)

    # Sketch38 → Cut-Extrude17 (cut)
    with BuildSketch(Plane(origin=(56.032258065, 0, 0), x_dir=(0, 0, -1), z_dir=(1, 0, 0))):
        with Locations((-2, 0)):
            Rectangle(SKETCH38_W, SKETCH38_H)
    extrude(amount=-CUT_EXTRUDE17_DEPTH, mode=Mode.SUBTRACT)

    # Sketch39 → Cut-Extrude18 (cut)
    with BuildSketch(Plane(origin=(0, 0, -2), x_dir=(-1, 0, 0), z_dir=(0, 0, -1))):
        with Locations((-53.016129032, 0)):
            Circle(SKETCH39_R)
    extrude(amount=-CUT_EXTRUDE18_DEPTH, mode=Mode.SUBTRACT)


solid = part.part
